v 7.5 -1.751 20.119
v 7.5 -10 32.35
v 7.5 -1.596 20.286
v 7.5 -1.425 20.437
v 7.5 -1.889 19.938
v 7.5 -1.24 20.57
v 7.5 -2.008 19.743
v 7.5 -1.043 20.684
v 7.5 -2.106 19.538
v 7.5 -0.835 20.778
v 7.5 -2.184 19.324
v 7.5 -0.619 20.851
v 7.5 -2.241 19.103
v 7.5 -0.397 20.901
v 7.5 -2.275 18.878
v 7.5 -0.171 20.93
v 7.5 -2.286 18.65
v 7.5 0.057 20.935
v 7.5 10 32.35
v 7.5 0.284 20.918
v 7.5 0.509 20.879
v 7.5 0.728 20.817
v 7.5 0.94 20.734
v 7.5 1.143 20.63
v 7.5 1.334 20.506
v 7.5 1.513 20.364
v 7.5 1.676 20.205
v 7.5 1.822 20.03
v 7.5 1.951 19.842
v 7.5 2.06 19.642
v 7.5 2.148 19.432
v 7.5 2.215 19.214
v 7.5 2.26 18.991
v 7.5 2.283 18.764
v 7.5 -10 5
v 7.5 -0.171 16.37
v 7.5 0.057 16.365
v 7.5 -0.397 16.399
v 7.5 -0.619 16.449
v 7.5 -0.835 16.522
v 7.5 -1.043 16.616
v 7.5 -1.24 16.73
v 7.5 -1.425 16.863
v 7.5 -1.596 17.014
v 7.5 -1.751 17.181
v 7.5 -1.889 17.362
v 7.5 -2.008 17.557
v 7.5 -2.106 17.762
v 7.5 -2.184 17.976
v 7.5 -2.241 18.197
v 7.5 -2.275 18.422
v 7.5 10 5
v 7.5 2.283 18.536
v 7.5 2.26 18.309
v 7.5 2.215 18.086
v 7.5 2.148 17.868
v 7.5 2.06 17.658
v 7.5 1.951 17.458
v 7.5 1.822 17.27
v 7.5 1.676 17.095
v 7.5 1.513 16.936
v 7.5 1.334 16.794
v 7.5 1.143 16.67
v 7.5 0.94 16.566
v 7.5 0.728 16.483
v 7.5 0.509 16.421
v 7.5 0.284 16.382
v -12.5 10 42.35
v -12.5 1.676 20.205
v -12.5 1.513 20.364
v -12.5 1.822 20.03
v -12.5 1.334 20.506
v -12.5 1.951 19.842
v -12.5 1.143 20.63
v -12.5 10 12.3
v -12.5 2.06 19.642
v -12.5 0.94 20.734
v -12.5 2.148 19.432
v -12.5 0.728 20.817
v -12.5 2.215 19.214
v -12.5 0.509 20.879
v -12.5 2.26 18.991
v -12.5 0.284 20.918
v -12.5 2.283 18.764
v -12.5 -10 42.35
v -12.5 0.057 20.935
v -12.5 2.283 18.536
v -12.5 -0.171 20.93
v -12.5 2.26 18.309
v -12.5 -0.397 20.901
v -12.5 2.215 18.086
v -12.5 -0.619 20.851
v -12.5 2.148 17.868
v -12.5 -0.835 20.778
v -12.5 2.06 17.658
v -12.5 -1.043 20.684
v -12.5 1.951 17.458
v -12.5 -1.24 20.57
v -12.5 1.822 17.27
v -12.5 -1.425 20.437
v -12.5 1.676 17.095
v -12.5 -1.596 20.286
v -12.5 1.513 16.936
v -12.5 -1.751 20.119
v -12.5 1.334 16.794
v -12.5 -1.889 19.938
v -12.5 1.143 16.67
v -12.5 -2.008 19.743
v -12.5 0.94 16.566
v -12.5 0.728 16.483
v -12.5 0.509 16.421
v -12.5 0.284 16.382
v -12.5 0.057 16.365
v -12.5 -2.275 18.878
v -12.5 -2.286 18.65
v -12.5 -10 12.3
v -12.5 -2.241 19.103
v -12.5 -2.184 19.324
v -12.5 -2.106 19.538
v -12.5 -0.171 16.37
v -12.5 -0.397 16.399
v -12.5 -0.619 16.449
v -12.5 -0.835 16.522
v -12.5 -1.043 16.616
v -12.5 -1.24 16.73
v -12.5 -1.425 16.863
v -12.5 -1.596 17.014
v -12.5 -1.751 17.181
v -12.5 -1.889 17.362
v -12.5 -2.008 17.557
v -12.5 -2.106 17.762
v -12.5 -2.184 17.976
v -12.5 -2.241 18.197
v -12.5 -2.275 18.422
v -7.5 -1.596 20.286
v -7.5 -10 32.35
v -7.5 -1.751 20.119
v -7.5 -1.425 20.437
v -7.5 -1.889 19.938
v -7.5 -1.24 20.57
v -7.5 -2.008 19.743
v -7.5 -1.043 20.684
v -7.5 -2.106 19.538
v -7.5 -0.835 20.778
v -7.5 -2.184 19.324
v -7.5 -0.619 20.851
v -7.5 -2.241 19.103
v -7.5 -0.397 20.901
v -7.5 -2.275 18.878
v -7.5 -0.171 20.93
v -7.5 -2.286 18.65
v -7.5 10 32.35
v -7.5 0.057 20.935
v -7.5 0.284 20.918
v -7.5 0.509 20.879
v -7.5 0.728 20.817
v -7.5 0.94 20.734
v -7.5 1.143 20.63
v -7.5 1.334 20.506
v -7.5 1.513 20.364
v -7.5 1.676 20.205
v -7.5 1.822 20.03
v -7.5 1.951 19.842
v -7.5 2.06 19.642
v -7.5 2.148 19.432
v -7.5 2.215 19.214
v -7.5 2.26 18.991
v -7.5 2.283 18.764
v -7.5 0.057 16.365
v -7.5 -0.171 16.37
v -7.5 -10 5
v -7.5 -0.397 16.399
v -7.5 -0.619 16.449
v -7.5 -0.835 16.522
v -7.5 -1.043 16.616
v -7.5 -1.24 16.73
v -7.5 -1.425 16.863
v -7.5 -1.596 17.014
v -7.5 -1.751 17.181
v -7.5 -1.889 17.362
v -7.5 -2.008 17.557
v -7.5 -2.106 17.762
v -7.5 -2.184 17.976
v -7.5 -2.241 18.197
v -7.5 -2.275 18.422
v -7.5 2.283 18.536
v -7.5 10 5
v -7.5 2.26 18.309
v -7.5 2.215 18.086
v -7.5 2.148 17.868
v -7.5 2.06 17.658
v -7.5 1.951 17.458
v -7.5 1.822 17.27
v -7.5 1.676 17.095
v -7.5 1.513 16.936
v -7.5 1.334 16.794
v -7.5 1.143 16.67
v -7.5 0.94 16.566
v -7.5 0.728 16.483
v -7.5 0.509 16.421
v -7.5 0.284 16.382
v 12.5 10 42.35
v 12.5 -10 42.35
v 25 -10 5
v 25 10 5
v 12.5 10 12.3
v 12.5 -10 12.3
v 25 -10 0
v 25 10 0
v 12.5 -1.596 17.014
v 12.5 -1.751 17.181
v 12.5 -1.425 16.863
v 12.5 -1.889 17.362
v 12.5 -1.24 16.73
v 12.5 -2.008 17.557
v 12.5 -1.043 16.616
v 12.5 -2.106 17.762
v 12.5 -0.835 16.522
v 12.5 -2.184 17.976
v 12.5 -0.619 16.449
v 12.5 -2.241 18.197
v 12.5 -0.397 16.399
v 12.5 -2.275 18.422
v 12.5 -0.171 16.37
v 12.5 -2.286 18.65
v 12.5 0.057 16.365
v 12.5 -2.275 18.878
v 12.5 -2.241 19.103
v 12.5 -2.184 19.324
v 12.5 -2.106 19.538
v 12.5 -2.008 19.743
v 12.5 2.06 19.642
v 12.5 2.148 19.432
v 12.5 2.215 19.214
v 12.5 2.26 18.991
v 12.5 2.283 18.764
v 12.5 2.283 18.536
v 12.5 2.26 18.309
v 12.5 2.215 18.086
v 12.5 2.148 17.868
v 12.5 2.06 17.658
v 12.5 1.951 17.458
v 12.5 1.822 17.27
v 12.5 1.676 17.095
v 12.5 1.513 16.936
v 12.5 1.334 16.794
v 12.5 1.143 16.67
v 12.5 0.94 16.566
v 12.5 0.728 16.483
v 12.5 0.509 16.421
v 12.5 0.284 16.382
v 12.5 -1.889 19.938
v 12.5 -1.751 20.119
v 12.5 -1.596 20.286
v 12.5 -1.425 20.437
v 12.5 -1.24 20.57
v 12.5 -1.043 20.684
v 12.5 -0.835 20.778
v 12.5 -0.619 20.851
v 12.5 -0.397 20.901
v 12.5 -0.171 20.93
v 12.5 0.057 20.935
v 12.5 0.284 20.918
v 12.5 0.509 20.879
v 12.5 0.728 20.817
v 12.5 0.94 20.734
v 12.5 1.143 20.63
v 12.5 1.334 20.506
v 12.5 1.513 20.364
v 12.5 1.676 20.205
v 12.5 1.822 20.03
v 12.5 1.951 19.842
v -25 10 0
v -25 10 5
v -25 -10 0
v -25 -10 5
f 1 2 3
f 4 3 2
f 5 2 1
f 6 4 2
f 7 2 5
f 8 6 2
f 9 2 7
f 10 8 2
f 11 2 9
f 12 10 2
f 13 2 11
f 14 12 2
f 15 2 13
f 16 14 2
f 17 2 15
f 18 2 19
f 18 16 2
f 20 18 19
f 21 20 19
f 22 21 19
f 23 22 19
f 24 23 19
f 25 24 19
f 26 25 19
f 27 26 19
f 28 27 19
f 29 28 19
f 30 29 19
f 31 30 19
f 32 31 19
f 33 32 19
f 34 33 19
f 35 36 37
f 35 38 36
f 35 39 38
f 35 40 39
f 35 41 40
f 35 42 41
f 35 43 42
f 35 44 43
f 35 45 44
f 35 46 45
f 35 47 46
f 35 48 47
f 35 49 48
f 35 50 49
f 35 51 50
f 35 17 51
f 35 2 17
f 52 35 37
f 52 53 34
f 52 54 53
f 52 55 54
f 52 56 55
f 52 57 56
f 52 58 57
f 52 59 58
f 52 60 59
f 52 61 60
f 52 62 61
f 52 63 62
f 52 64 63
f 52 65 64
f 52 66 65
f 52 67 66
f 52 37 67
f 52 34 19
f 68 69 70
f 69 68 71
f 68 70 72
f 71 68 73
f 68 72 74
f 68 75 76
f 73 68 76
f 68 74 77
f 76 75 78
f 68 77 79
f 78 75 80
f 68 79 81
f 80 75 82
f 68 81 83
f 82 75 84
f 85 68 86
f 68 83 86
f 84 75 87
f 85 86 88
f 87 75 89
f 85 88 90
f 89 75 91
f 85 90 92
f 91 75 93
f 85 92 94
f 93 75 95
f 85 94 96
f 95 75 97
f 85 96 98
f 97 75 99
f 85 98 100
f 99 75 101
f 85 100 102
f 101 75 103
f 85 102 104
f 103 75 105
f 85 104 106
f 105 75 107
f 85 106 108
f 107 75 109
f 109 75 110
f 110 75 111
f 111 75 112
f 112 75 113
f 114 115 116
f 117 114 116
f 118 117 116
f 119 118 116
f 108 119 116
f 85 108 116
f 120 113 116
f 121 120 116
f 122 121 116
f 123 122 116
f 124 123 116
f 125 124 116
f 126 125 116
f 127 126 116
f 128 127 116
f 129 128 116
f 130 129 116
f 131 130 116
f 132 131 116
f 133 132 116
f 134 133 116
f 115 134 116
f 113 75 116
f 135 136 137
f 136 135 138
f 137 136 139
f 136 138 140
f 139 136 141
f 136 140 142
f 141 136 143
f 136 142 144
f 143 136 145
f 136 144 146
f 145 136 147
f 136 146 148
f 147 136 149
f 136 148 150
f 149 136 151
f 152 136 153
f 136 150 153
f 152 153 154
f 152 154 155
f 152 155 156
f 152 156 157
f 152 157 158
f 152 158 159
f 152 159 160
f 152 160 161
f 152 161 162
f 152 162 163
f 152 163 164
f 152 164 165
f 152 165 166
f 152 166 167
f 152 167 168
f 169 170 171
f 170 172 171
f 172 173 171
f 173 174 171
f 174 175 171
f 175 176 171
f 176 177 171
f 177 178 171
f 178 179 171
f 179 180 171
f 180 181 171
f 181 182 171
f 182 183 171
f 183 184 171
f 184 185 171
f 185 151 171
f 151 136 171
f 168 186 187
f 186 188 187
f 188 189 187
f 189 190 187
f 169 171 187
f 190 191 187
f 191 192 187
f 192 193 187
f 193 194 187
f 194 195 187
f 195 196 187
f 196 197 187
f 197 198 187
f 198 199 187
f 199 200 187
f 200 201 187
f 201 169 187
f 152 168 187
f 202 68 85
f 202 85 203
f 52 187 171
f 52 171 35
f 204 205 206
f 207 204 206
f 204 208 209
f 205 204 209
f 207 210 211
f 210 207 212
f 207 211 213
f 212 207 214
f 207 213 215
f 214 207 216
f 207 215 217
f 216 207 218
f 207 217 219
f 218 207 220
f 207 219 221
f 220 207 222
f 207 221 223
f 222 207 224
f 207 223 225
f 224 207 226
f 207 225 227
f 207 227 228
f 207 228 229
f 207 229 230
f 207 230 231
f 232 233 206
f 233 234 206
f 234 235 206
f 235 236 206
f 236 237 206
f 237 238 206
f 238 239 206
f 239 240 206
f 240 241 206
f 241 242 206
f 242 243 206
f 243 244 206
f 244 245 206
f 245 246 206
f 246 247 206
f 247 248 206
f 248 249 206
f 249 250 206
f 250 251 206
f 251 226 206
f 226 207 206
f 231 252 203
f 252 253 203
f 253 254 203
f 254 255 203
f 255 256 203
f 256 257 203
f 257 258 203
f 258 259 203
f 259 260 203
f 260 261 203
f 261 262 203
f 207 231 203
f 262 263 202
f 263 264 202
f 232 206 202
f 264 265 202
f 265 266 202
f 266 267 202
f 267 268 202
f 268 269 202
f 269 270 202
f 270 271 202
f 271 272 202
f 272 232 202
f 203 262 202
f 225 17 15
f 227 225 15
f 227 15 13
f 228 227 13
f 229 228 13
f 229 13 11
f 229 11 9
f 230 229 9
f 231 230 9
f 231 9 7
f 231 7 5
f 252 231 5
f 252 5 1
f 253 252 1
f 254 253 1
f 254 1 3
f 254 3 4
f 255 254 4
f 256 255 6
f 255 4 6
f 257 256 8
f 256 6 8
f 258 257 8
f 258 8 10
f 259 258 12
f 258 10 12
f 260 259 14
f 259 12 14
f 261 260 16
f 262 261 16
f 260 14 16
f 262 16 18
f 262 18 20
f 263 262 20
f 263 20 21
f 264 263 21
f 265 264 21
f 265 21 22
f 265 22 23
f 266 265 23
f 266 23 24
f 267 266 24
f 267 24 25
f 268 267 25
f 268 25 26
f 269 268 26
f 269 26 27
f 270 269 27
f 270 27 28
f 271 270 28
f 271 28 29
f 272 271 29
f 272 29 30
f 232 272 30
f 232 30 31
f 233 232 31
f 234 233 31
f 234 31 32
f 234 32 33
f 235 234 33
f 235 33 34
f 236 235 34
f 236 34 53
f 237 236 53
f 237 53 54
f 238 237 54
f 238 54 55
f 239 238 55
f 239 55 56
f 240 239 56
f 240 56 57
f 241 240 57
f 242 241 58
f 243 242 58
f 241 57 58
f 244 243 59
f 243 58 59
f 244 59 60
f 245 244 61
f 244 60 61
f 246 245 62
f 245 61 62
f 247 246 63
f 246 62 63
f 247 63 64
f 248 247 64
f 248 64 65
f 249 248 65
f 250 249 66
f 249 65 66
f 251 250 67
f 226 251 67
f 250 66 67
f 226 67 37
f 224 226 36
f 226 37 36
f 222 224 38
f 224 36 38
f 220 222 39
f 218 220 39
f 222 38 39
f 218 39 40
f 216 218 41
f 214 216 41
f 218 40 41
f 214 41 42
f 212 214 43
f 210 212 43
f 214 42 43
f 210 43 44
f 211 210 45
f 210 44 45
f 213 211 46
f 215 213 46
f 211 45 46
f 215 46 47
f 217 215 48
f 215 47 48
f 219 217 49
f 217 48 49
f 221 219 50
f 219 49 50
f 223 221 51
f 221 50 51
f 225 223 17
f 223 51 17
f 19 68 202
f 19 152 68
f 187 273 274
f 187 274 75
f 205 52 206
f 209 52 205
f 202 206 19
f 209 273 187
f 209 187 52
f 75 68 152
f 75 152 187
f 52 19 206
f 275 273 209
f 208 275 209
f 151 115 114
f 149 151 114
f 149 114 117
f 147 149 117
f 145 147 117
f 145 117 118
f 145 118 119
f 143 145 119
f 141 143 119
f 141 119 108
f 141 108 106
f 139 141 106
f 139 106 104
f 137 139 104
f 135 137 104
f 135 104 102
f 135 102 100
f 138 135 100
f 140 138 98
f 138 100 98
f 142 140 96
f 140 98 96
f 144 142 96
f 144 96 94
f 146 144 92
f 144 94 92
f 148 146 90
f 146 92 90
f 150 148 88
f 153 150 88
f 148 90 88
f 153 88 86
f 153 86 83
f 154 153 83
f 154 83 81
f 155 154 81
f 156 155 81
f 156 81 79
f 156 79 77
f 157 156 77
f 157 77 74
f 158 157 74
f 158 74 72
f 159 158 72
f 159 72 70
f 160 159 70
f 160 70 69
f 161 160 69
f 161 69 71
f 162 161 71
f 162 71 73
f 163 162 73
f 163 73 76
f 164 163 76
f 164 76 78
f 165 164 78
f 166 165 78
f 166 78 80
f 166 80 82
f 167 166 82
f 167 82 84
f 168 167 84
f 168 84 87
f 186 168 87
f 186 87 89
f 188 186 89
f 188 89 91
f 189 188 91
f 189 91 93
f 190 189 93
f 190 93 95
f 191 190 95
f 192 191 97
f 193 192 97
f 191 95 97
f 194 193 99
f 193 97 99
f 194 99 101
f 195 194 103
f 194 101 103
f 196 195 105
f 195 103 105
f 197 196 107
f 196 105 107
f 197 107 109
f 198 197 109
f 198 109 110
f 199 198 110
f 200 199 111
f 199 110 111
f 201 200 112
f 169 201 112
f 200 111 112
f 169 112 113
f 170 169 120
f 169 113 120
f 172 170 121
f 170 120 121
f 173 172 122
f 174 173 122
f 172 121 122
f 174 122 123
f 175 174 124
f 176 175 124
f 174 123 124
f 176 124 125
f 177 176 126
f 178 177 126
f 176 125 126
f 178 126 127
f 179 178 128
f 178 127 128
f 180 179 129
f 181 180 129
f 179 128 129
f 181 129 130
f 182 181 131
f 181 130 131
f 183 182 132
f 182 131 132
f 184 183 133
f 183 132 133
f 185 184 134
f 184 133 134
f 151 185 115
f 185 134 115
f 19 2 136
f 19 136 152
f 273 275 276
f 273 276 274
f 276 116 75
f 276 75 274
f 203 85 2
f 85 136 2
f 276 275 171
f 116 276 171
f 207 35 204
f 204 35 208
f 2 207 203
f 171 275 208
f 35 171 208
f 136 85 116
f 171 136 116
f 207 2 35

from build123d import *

# Parameters (mm, degrees)
F0_W      = 50
F0_H      = 20
F1_DEPTH  = 5
F2_W      = 17.5
F2_H      = 20
F3_DEPTH  = 20
F5_DEPTH  = 20.001
F6_R      = 2.286
F7_DEPTH  = 37.501
F8_DEPTH  = 17.35
F9_W      = 20
F9_H      = 10
F10_DEPTH = 25


with BuildPart() as f1:
    # F0 (on Top) → F1 (new body)
    with BuildSketch(Plane.XY):
        Rectangle(F0_W, F0_H)
    extrude(amount=F1_DEPTH)

    # F2 (on face) → F3 (join)
    with BuildSketch(Plane.XY.offset(5)):
        with Locations((16.25, 0)):
            Rectangle(F2_W, F2_H)
        with Locations((-16.25, 0)):
            Rectangle(F2_W, F2_H)
    extrude(amount=F3_DEPTH)

    # F4 (on face) → F5 (cut, through all)
    with BuildSketch(Plane(origin=(0, 10, 0), x_dir=(-1, 0, 0), z_dir=(0, 1, 0))):
        Polygon((-25, 5), (-12.5, 12.3), (-12.5, 25), (-25, 25), align=None)
        Polygon((12.5, 25), (12.5, 12.3), (25, 5), (25, 25), align=None)
    extrude(amount=-F5_DEPTH, mode=Mode.SUBTRACT)

    # F6 (on face) → F7 (cut, through all)
    with BuildSketch(Plane(origin=(-12.5, 0, 0), x_dir=(0, -1, 0), z_dir=(-1, 0, 0))):
        with Locations((0, 18.65)):
            Circle(F6_R)
    extrude(amount=-F7_DEPTH, mode=Mode.SUBTRACT)

    # F8 (add): faces of the model
    f8_faces = [f1.faces().sort_by_distance(p)[0] for p in [
        (-10, 0, 25),
        (10, 0, 25),
    ]]
    extrude(f8_faces, amount=F8_DEPTH)

    # F9 (on face) → F10 (join, through all)
    with BuildSketch(Plane.YZ.offset(12.5)):
        with Locations((0, 37.35)):
            Rectangle(F9_W, F9_H)
    extrude(amount=-F10_DEPTH)


solid = f1.part
